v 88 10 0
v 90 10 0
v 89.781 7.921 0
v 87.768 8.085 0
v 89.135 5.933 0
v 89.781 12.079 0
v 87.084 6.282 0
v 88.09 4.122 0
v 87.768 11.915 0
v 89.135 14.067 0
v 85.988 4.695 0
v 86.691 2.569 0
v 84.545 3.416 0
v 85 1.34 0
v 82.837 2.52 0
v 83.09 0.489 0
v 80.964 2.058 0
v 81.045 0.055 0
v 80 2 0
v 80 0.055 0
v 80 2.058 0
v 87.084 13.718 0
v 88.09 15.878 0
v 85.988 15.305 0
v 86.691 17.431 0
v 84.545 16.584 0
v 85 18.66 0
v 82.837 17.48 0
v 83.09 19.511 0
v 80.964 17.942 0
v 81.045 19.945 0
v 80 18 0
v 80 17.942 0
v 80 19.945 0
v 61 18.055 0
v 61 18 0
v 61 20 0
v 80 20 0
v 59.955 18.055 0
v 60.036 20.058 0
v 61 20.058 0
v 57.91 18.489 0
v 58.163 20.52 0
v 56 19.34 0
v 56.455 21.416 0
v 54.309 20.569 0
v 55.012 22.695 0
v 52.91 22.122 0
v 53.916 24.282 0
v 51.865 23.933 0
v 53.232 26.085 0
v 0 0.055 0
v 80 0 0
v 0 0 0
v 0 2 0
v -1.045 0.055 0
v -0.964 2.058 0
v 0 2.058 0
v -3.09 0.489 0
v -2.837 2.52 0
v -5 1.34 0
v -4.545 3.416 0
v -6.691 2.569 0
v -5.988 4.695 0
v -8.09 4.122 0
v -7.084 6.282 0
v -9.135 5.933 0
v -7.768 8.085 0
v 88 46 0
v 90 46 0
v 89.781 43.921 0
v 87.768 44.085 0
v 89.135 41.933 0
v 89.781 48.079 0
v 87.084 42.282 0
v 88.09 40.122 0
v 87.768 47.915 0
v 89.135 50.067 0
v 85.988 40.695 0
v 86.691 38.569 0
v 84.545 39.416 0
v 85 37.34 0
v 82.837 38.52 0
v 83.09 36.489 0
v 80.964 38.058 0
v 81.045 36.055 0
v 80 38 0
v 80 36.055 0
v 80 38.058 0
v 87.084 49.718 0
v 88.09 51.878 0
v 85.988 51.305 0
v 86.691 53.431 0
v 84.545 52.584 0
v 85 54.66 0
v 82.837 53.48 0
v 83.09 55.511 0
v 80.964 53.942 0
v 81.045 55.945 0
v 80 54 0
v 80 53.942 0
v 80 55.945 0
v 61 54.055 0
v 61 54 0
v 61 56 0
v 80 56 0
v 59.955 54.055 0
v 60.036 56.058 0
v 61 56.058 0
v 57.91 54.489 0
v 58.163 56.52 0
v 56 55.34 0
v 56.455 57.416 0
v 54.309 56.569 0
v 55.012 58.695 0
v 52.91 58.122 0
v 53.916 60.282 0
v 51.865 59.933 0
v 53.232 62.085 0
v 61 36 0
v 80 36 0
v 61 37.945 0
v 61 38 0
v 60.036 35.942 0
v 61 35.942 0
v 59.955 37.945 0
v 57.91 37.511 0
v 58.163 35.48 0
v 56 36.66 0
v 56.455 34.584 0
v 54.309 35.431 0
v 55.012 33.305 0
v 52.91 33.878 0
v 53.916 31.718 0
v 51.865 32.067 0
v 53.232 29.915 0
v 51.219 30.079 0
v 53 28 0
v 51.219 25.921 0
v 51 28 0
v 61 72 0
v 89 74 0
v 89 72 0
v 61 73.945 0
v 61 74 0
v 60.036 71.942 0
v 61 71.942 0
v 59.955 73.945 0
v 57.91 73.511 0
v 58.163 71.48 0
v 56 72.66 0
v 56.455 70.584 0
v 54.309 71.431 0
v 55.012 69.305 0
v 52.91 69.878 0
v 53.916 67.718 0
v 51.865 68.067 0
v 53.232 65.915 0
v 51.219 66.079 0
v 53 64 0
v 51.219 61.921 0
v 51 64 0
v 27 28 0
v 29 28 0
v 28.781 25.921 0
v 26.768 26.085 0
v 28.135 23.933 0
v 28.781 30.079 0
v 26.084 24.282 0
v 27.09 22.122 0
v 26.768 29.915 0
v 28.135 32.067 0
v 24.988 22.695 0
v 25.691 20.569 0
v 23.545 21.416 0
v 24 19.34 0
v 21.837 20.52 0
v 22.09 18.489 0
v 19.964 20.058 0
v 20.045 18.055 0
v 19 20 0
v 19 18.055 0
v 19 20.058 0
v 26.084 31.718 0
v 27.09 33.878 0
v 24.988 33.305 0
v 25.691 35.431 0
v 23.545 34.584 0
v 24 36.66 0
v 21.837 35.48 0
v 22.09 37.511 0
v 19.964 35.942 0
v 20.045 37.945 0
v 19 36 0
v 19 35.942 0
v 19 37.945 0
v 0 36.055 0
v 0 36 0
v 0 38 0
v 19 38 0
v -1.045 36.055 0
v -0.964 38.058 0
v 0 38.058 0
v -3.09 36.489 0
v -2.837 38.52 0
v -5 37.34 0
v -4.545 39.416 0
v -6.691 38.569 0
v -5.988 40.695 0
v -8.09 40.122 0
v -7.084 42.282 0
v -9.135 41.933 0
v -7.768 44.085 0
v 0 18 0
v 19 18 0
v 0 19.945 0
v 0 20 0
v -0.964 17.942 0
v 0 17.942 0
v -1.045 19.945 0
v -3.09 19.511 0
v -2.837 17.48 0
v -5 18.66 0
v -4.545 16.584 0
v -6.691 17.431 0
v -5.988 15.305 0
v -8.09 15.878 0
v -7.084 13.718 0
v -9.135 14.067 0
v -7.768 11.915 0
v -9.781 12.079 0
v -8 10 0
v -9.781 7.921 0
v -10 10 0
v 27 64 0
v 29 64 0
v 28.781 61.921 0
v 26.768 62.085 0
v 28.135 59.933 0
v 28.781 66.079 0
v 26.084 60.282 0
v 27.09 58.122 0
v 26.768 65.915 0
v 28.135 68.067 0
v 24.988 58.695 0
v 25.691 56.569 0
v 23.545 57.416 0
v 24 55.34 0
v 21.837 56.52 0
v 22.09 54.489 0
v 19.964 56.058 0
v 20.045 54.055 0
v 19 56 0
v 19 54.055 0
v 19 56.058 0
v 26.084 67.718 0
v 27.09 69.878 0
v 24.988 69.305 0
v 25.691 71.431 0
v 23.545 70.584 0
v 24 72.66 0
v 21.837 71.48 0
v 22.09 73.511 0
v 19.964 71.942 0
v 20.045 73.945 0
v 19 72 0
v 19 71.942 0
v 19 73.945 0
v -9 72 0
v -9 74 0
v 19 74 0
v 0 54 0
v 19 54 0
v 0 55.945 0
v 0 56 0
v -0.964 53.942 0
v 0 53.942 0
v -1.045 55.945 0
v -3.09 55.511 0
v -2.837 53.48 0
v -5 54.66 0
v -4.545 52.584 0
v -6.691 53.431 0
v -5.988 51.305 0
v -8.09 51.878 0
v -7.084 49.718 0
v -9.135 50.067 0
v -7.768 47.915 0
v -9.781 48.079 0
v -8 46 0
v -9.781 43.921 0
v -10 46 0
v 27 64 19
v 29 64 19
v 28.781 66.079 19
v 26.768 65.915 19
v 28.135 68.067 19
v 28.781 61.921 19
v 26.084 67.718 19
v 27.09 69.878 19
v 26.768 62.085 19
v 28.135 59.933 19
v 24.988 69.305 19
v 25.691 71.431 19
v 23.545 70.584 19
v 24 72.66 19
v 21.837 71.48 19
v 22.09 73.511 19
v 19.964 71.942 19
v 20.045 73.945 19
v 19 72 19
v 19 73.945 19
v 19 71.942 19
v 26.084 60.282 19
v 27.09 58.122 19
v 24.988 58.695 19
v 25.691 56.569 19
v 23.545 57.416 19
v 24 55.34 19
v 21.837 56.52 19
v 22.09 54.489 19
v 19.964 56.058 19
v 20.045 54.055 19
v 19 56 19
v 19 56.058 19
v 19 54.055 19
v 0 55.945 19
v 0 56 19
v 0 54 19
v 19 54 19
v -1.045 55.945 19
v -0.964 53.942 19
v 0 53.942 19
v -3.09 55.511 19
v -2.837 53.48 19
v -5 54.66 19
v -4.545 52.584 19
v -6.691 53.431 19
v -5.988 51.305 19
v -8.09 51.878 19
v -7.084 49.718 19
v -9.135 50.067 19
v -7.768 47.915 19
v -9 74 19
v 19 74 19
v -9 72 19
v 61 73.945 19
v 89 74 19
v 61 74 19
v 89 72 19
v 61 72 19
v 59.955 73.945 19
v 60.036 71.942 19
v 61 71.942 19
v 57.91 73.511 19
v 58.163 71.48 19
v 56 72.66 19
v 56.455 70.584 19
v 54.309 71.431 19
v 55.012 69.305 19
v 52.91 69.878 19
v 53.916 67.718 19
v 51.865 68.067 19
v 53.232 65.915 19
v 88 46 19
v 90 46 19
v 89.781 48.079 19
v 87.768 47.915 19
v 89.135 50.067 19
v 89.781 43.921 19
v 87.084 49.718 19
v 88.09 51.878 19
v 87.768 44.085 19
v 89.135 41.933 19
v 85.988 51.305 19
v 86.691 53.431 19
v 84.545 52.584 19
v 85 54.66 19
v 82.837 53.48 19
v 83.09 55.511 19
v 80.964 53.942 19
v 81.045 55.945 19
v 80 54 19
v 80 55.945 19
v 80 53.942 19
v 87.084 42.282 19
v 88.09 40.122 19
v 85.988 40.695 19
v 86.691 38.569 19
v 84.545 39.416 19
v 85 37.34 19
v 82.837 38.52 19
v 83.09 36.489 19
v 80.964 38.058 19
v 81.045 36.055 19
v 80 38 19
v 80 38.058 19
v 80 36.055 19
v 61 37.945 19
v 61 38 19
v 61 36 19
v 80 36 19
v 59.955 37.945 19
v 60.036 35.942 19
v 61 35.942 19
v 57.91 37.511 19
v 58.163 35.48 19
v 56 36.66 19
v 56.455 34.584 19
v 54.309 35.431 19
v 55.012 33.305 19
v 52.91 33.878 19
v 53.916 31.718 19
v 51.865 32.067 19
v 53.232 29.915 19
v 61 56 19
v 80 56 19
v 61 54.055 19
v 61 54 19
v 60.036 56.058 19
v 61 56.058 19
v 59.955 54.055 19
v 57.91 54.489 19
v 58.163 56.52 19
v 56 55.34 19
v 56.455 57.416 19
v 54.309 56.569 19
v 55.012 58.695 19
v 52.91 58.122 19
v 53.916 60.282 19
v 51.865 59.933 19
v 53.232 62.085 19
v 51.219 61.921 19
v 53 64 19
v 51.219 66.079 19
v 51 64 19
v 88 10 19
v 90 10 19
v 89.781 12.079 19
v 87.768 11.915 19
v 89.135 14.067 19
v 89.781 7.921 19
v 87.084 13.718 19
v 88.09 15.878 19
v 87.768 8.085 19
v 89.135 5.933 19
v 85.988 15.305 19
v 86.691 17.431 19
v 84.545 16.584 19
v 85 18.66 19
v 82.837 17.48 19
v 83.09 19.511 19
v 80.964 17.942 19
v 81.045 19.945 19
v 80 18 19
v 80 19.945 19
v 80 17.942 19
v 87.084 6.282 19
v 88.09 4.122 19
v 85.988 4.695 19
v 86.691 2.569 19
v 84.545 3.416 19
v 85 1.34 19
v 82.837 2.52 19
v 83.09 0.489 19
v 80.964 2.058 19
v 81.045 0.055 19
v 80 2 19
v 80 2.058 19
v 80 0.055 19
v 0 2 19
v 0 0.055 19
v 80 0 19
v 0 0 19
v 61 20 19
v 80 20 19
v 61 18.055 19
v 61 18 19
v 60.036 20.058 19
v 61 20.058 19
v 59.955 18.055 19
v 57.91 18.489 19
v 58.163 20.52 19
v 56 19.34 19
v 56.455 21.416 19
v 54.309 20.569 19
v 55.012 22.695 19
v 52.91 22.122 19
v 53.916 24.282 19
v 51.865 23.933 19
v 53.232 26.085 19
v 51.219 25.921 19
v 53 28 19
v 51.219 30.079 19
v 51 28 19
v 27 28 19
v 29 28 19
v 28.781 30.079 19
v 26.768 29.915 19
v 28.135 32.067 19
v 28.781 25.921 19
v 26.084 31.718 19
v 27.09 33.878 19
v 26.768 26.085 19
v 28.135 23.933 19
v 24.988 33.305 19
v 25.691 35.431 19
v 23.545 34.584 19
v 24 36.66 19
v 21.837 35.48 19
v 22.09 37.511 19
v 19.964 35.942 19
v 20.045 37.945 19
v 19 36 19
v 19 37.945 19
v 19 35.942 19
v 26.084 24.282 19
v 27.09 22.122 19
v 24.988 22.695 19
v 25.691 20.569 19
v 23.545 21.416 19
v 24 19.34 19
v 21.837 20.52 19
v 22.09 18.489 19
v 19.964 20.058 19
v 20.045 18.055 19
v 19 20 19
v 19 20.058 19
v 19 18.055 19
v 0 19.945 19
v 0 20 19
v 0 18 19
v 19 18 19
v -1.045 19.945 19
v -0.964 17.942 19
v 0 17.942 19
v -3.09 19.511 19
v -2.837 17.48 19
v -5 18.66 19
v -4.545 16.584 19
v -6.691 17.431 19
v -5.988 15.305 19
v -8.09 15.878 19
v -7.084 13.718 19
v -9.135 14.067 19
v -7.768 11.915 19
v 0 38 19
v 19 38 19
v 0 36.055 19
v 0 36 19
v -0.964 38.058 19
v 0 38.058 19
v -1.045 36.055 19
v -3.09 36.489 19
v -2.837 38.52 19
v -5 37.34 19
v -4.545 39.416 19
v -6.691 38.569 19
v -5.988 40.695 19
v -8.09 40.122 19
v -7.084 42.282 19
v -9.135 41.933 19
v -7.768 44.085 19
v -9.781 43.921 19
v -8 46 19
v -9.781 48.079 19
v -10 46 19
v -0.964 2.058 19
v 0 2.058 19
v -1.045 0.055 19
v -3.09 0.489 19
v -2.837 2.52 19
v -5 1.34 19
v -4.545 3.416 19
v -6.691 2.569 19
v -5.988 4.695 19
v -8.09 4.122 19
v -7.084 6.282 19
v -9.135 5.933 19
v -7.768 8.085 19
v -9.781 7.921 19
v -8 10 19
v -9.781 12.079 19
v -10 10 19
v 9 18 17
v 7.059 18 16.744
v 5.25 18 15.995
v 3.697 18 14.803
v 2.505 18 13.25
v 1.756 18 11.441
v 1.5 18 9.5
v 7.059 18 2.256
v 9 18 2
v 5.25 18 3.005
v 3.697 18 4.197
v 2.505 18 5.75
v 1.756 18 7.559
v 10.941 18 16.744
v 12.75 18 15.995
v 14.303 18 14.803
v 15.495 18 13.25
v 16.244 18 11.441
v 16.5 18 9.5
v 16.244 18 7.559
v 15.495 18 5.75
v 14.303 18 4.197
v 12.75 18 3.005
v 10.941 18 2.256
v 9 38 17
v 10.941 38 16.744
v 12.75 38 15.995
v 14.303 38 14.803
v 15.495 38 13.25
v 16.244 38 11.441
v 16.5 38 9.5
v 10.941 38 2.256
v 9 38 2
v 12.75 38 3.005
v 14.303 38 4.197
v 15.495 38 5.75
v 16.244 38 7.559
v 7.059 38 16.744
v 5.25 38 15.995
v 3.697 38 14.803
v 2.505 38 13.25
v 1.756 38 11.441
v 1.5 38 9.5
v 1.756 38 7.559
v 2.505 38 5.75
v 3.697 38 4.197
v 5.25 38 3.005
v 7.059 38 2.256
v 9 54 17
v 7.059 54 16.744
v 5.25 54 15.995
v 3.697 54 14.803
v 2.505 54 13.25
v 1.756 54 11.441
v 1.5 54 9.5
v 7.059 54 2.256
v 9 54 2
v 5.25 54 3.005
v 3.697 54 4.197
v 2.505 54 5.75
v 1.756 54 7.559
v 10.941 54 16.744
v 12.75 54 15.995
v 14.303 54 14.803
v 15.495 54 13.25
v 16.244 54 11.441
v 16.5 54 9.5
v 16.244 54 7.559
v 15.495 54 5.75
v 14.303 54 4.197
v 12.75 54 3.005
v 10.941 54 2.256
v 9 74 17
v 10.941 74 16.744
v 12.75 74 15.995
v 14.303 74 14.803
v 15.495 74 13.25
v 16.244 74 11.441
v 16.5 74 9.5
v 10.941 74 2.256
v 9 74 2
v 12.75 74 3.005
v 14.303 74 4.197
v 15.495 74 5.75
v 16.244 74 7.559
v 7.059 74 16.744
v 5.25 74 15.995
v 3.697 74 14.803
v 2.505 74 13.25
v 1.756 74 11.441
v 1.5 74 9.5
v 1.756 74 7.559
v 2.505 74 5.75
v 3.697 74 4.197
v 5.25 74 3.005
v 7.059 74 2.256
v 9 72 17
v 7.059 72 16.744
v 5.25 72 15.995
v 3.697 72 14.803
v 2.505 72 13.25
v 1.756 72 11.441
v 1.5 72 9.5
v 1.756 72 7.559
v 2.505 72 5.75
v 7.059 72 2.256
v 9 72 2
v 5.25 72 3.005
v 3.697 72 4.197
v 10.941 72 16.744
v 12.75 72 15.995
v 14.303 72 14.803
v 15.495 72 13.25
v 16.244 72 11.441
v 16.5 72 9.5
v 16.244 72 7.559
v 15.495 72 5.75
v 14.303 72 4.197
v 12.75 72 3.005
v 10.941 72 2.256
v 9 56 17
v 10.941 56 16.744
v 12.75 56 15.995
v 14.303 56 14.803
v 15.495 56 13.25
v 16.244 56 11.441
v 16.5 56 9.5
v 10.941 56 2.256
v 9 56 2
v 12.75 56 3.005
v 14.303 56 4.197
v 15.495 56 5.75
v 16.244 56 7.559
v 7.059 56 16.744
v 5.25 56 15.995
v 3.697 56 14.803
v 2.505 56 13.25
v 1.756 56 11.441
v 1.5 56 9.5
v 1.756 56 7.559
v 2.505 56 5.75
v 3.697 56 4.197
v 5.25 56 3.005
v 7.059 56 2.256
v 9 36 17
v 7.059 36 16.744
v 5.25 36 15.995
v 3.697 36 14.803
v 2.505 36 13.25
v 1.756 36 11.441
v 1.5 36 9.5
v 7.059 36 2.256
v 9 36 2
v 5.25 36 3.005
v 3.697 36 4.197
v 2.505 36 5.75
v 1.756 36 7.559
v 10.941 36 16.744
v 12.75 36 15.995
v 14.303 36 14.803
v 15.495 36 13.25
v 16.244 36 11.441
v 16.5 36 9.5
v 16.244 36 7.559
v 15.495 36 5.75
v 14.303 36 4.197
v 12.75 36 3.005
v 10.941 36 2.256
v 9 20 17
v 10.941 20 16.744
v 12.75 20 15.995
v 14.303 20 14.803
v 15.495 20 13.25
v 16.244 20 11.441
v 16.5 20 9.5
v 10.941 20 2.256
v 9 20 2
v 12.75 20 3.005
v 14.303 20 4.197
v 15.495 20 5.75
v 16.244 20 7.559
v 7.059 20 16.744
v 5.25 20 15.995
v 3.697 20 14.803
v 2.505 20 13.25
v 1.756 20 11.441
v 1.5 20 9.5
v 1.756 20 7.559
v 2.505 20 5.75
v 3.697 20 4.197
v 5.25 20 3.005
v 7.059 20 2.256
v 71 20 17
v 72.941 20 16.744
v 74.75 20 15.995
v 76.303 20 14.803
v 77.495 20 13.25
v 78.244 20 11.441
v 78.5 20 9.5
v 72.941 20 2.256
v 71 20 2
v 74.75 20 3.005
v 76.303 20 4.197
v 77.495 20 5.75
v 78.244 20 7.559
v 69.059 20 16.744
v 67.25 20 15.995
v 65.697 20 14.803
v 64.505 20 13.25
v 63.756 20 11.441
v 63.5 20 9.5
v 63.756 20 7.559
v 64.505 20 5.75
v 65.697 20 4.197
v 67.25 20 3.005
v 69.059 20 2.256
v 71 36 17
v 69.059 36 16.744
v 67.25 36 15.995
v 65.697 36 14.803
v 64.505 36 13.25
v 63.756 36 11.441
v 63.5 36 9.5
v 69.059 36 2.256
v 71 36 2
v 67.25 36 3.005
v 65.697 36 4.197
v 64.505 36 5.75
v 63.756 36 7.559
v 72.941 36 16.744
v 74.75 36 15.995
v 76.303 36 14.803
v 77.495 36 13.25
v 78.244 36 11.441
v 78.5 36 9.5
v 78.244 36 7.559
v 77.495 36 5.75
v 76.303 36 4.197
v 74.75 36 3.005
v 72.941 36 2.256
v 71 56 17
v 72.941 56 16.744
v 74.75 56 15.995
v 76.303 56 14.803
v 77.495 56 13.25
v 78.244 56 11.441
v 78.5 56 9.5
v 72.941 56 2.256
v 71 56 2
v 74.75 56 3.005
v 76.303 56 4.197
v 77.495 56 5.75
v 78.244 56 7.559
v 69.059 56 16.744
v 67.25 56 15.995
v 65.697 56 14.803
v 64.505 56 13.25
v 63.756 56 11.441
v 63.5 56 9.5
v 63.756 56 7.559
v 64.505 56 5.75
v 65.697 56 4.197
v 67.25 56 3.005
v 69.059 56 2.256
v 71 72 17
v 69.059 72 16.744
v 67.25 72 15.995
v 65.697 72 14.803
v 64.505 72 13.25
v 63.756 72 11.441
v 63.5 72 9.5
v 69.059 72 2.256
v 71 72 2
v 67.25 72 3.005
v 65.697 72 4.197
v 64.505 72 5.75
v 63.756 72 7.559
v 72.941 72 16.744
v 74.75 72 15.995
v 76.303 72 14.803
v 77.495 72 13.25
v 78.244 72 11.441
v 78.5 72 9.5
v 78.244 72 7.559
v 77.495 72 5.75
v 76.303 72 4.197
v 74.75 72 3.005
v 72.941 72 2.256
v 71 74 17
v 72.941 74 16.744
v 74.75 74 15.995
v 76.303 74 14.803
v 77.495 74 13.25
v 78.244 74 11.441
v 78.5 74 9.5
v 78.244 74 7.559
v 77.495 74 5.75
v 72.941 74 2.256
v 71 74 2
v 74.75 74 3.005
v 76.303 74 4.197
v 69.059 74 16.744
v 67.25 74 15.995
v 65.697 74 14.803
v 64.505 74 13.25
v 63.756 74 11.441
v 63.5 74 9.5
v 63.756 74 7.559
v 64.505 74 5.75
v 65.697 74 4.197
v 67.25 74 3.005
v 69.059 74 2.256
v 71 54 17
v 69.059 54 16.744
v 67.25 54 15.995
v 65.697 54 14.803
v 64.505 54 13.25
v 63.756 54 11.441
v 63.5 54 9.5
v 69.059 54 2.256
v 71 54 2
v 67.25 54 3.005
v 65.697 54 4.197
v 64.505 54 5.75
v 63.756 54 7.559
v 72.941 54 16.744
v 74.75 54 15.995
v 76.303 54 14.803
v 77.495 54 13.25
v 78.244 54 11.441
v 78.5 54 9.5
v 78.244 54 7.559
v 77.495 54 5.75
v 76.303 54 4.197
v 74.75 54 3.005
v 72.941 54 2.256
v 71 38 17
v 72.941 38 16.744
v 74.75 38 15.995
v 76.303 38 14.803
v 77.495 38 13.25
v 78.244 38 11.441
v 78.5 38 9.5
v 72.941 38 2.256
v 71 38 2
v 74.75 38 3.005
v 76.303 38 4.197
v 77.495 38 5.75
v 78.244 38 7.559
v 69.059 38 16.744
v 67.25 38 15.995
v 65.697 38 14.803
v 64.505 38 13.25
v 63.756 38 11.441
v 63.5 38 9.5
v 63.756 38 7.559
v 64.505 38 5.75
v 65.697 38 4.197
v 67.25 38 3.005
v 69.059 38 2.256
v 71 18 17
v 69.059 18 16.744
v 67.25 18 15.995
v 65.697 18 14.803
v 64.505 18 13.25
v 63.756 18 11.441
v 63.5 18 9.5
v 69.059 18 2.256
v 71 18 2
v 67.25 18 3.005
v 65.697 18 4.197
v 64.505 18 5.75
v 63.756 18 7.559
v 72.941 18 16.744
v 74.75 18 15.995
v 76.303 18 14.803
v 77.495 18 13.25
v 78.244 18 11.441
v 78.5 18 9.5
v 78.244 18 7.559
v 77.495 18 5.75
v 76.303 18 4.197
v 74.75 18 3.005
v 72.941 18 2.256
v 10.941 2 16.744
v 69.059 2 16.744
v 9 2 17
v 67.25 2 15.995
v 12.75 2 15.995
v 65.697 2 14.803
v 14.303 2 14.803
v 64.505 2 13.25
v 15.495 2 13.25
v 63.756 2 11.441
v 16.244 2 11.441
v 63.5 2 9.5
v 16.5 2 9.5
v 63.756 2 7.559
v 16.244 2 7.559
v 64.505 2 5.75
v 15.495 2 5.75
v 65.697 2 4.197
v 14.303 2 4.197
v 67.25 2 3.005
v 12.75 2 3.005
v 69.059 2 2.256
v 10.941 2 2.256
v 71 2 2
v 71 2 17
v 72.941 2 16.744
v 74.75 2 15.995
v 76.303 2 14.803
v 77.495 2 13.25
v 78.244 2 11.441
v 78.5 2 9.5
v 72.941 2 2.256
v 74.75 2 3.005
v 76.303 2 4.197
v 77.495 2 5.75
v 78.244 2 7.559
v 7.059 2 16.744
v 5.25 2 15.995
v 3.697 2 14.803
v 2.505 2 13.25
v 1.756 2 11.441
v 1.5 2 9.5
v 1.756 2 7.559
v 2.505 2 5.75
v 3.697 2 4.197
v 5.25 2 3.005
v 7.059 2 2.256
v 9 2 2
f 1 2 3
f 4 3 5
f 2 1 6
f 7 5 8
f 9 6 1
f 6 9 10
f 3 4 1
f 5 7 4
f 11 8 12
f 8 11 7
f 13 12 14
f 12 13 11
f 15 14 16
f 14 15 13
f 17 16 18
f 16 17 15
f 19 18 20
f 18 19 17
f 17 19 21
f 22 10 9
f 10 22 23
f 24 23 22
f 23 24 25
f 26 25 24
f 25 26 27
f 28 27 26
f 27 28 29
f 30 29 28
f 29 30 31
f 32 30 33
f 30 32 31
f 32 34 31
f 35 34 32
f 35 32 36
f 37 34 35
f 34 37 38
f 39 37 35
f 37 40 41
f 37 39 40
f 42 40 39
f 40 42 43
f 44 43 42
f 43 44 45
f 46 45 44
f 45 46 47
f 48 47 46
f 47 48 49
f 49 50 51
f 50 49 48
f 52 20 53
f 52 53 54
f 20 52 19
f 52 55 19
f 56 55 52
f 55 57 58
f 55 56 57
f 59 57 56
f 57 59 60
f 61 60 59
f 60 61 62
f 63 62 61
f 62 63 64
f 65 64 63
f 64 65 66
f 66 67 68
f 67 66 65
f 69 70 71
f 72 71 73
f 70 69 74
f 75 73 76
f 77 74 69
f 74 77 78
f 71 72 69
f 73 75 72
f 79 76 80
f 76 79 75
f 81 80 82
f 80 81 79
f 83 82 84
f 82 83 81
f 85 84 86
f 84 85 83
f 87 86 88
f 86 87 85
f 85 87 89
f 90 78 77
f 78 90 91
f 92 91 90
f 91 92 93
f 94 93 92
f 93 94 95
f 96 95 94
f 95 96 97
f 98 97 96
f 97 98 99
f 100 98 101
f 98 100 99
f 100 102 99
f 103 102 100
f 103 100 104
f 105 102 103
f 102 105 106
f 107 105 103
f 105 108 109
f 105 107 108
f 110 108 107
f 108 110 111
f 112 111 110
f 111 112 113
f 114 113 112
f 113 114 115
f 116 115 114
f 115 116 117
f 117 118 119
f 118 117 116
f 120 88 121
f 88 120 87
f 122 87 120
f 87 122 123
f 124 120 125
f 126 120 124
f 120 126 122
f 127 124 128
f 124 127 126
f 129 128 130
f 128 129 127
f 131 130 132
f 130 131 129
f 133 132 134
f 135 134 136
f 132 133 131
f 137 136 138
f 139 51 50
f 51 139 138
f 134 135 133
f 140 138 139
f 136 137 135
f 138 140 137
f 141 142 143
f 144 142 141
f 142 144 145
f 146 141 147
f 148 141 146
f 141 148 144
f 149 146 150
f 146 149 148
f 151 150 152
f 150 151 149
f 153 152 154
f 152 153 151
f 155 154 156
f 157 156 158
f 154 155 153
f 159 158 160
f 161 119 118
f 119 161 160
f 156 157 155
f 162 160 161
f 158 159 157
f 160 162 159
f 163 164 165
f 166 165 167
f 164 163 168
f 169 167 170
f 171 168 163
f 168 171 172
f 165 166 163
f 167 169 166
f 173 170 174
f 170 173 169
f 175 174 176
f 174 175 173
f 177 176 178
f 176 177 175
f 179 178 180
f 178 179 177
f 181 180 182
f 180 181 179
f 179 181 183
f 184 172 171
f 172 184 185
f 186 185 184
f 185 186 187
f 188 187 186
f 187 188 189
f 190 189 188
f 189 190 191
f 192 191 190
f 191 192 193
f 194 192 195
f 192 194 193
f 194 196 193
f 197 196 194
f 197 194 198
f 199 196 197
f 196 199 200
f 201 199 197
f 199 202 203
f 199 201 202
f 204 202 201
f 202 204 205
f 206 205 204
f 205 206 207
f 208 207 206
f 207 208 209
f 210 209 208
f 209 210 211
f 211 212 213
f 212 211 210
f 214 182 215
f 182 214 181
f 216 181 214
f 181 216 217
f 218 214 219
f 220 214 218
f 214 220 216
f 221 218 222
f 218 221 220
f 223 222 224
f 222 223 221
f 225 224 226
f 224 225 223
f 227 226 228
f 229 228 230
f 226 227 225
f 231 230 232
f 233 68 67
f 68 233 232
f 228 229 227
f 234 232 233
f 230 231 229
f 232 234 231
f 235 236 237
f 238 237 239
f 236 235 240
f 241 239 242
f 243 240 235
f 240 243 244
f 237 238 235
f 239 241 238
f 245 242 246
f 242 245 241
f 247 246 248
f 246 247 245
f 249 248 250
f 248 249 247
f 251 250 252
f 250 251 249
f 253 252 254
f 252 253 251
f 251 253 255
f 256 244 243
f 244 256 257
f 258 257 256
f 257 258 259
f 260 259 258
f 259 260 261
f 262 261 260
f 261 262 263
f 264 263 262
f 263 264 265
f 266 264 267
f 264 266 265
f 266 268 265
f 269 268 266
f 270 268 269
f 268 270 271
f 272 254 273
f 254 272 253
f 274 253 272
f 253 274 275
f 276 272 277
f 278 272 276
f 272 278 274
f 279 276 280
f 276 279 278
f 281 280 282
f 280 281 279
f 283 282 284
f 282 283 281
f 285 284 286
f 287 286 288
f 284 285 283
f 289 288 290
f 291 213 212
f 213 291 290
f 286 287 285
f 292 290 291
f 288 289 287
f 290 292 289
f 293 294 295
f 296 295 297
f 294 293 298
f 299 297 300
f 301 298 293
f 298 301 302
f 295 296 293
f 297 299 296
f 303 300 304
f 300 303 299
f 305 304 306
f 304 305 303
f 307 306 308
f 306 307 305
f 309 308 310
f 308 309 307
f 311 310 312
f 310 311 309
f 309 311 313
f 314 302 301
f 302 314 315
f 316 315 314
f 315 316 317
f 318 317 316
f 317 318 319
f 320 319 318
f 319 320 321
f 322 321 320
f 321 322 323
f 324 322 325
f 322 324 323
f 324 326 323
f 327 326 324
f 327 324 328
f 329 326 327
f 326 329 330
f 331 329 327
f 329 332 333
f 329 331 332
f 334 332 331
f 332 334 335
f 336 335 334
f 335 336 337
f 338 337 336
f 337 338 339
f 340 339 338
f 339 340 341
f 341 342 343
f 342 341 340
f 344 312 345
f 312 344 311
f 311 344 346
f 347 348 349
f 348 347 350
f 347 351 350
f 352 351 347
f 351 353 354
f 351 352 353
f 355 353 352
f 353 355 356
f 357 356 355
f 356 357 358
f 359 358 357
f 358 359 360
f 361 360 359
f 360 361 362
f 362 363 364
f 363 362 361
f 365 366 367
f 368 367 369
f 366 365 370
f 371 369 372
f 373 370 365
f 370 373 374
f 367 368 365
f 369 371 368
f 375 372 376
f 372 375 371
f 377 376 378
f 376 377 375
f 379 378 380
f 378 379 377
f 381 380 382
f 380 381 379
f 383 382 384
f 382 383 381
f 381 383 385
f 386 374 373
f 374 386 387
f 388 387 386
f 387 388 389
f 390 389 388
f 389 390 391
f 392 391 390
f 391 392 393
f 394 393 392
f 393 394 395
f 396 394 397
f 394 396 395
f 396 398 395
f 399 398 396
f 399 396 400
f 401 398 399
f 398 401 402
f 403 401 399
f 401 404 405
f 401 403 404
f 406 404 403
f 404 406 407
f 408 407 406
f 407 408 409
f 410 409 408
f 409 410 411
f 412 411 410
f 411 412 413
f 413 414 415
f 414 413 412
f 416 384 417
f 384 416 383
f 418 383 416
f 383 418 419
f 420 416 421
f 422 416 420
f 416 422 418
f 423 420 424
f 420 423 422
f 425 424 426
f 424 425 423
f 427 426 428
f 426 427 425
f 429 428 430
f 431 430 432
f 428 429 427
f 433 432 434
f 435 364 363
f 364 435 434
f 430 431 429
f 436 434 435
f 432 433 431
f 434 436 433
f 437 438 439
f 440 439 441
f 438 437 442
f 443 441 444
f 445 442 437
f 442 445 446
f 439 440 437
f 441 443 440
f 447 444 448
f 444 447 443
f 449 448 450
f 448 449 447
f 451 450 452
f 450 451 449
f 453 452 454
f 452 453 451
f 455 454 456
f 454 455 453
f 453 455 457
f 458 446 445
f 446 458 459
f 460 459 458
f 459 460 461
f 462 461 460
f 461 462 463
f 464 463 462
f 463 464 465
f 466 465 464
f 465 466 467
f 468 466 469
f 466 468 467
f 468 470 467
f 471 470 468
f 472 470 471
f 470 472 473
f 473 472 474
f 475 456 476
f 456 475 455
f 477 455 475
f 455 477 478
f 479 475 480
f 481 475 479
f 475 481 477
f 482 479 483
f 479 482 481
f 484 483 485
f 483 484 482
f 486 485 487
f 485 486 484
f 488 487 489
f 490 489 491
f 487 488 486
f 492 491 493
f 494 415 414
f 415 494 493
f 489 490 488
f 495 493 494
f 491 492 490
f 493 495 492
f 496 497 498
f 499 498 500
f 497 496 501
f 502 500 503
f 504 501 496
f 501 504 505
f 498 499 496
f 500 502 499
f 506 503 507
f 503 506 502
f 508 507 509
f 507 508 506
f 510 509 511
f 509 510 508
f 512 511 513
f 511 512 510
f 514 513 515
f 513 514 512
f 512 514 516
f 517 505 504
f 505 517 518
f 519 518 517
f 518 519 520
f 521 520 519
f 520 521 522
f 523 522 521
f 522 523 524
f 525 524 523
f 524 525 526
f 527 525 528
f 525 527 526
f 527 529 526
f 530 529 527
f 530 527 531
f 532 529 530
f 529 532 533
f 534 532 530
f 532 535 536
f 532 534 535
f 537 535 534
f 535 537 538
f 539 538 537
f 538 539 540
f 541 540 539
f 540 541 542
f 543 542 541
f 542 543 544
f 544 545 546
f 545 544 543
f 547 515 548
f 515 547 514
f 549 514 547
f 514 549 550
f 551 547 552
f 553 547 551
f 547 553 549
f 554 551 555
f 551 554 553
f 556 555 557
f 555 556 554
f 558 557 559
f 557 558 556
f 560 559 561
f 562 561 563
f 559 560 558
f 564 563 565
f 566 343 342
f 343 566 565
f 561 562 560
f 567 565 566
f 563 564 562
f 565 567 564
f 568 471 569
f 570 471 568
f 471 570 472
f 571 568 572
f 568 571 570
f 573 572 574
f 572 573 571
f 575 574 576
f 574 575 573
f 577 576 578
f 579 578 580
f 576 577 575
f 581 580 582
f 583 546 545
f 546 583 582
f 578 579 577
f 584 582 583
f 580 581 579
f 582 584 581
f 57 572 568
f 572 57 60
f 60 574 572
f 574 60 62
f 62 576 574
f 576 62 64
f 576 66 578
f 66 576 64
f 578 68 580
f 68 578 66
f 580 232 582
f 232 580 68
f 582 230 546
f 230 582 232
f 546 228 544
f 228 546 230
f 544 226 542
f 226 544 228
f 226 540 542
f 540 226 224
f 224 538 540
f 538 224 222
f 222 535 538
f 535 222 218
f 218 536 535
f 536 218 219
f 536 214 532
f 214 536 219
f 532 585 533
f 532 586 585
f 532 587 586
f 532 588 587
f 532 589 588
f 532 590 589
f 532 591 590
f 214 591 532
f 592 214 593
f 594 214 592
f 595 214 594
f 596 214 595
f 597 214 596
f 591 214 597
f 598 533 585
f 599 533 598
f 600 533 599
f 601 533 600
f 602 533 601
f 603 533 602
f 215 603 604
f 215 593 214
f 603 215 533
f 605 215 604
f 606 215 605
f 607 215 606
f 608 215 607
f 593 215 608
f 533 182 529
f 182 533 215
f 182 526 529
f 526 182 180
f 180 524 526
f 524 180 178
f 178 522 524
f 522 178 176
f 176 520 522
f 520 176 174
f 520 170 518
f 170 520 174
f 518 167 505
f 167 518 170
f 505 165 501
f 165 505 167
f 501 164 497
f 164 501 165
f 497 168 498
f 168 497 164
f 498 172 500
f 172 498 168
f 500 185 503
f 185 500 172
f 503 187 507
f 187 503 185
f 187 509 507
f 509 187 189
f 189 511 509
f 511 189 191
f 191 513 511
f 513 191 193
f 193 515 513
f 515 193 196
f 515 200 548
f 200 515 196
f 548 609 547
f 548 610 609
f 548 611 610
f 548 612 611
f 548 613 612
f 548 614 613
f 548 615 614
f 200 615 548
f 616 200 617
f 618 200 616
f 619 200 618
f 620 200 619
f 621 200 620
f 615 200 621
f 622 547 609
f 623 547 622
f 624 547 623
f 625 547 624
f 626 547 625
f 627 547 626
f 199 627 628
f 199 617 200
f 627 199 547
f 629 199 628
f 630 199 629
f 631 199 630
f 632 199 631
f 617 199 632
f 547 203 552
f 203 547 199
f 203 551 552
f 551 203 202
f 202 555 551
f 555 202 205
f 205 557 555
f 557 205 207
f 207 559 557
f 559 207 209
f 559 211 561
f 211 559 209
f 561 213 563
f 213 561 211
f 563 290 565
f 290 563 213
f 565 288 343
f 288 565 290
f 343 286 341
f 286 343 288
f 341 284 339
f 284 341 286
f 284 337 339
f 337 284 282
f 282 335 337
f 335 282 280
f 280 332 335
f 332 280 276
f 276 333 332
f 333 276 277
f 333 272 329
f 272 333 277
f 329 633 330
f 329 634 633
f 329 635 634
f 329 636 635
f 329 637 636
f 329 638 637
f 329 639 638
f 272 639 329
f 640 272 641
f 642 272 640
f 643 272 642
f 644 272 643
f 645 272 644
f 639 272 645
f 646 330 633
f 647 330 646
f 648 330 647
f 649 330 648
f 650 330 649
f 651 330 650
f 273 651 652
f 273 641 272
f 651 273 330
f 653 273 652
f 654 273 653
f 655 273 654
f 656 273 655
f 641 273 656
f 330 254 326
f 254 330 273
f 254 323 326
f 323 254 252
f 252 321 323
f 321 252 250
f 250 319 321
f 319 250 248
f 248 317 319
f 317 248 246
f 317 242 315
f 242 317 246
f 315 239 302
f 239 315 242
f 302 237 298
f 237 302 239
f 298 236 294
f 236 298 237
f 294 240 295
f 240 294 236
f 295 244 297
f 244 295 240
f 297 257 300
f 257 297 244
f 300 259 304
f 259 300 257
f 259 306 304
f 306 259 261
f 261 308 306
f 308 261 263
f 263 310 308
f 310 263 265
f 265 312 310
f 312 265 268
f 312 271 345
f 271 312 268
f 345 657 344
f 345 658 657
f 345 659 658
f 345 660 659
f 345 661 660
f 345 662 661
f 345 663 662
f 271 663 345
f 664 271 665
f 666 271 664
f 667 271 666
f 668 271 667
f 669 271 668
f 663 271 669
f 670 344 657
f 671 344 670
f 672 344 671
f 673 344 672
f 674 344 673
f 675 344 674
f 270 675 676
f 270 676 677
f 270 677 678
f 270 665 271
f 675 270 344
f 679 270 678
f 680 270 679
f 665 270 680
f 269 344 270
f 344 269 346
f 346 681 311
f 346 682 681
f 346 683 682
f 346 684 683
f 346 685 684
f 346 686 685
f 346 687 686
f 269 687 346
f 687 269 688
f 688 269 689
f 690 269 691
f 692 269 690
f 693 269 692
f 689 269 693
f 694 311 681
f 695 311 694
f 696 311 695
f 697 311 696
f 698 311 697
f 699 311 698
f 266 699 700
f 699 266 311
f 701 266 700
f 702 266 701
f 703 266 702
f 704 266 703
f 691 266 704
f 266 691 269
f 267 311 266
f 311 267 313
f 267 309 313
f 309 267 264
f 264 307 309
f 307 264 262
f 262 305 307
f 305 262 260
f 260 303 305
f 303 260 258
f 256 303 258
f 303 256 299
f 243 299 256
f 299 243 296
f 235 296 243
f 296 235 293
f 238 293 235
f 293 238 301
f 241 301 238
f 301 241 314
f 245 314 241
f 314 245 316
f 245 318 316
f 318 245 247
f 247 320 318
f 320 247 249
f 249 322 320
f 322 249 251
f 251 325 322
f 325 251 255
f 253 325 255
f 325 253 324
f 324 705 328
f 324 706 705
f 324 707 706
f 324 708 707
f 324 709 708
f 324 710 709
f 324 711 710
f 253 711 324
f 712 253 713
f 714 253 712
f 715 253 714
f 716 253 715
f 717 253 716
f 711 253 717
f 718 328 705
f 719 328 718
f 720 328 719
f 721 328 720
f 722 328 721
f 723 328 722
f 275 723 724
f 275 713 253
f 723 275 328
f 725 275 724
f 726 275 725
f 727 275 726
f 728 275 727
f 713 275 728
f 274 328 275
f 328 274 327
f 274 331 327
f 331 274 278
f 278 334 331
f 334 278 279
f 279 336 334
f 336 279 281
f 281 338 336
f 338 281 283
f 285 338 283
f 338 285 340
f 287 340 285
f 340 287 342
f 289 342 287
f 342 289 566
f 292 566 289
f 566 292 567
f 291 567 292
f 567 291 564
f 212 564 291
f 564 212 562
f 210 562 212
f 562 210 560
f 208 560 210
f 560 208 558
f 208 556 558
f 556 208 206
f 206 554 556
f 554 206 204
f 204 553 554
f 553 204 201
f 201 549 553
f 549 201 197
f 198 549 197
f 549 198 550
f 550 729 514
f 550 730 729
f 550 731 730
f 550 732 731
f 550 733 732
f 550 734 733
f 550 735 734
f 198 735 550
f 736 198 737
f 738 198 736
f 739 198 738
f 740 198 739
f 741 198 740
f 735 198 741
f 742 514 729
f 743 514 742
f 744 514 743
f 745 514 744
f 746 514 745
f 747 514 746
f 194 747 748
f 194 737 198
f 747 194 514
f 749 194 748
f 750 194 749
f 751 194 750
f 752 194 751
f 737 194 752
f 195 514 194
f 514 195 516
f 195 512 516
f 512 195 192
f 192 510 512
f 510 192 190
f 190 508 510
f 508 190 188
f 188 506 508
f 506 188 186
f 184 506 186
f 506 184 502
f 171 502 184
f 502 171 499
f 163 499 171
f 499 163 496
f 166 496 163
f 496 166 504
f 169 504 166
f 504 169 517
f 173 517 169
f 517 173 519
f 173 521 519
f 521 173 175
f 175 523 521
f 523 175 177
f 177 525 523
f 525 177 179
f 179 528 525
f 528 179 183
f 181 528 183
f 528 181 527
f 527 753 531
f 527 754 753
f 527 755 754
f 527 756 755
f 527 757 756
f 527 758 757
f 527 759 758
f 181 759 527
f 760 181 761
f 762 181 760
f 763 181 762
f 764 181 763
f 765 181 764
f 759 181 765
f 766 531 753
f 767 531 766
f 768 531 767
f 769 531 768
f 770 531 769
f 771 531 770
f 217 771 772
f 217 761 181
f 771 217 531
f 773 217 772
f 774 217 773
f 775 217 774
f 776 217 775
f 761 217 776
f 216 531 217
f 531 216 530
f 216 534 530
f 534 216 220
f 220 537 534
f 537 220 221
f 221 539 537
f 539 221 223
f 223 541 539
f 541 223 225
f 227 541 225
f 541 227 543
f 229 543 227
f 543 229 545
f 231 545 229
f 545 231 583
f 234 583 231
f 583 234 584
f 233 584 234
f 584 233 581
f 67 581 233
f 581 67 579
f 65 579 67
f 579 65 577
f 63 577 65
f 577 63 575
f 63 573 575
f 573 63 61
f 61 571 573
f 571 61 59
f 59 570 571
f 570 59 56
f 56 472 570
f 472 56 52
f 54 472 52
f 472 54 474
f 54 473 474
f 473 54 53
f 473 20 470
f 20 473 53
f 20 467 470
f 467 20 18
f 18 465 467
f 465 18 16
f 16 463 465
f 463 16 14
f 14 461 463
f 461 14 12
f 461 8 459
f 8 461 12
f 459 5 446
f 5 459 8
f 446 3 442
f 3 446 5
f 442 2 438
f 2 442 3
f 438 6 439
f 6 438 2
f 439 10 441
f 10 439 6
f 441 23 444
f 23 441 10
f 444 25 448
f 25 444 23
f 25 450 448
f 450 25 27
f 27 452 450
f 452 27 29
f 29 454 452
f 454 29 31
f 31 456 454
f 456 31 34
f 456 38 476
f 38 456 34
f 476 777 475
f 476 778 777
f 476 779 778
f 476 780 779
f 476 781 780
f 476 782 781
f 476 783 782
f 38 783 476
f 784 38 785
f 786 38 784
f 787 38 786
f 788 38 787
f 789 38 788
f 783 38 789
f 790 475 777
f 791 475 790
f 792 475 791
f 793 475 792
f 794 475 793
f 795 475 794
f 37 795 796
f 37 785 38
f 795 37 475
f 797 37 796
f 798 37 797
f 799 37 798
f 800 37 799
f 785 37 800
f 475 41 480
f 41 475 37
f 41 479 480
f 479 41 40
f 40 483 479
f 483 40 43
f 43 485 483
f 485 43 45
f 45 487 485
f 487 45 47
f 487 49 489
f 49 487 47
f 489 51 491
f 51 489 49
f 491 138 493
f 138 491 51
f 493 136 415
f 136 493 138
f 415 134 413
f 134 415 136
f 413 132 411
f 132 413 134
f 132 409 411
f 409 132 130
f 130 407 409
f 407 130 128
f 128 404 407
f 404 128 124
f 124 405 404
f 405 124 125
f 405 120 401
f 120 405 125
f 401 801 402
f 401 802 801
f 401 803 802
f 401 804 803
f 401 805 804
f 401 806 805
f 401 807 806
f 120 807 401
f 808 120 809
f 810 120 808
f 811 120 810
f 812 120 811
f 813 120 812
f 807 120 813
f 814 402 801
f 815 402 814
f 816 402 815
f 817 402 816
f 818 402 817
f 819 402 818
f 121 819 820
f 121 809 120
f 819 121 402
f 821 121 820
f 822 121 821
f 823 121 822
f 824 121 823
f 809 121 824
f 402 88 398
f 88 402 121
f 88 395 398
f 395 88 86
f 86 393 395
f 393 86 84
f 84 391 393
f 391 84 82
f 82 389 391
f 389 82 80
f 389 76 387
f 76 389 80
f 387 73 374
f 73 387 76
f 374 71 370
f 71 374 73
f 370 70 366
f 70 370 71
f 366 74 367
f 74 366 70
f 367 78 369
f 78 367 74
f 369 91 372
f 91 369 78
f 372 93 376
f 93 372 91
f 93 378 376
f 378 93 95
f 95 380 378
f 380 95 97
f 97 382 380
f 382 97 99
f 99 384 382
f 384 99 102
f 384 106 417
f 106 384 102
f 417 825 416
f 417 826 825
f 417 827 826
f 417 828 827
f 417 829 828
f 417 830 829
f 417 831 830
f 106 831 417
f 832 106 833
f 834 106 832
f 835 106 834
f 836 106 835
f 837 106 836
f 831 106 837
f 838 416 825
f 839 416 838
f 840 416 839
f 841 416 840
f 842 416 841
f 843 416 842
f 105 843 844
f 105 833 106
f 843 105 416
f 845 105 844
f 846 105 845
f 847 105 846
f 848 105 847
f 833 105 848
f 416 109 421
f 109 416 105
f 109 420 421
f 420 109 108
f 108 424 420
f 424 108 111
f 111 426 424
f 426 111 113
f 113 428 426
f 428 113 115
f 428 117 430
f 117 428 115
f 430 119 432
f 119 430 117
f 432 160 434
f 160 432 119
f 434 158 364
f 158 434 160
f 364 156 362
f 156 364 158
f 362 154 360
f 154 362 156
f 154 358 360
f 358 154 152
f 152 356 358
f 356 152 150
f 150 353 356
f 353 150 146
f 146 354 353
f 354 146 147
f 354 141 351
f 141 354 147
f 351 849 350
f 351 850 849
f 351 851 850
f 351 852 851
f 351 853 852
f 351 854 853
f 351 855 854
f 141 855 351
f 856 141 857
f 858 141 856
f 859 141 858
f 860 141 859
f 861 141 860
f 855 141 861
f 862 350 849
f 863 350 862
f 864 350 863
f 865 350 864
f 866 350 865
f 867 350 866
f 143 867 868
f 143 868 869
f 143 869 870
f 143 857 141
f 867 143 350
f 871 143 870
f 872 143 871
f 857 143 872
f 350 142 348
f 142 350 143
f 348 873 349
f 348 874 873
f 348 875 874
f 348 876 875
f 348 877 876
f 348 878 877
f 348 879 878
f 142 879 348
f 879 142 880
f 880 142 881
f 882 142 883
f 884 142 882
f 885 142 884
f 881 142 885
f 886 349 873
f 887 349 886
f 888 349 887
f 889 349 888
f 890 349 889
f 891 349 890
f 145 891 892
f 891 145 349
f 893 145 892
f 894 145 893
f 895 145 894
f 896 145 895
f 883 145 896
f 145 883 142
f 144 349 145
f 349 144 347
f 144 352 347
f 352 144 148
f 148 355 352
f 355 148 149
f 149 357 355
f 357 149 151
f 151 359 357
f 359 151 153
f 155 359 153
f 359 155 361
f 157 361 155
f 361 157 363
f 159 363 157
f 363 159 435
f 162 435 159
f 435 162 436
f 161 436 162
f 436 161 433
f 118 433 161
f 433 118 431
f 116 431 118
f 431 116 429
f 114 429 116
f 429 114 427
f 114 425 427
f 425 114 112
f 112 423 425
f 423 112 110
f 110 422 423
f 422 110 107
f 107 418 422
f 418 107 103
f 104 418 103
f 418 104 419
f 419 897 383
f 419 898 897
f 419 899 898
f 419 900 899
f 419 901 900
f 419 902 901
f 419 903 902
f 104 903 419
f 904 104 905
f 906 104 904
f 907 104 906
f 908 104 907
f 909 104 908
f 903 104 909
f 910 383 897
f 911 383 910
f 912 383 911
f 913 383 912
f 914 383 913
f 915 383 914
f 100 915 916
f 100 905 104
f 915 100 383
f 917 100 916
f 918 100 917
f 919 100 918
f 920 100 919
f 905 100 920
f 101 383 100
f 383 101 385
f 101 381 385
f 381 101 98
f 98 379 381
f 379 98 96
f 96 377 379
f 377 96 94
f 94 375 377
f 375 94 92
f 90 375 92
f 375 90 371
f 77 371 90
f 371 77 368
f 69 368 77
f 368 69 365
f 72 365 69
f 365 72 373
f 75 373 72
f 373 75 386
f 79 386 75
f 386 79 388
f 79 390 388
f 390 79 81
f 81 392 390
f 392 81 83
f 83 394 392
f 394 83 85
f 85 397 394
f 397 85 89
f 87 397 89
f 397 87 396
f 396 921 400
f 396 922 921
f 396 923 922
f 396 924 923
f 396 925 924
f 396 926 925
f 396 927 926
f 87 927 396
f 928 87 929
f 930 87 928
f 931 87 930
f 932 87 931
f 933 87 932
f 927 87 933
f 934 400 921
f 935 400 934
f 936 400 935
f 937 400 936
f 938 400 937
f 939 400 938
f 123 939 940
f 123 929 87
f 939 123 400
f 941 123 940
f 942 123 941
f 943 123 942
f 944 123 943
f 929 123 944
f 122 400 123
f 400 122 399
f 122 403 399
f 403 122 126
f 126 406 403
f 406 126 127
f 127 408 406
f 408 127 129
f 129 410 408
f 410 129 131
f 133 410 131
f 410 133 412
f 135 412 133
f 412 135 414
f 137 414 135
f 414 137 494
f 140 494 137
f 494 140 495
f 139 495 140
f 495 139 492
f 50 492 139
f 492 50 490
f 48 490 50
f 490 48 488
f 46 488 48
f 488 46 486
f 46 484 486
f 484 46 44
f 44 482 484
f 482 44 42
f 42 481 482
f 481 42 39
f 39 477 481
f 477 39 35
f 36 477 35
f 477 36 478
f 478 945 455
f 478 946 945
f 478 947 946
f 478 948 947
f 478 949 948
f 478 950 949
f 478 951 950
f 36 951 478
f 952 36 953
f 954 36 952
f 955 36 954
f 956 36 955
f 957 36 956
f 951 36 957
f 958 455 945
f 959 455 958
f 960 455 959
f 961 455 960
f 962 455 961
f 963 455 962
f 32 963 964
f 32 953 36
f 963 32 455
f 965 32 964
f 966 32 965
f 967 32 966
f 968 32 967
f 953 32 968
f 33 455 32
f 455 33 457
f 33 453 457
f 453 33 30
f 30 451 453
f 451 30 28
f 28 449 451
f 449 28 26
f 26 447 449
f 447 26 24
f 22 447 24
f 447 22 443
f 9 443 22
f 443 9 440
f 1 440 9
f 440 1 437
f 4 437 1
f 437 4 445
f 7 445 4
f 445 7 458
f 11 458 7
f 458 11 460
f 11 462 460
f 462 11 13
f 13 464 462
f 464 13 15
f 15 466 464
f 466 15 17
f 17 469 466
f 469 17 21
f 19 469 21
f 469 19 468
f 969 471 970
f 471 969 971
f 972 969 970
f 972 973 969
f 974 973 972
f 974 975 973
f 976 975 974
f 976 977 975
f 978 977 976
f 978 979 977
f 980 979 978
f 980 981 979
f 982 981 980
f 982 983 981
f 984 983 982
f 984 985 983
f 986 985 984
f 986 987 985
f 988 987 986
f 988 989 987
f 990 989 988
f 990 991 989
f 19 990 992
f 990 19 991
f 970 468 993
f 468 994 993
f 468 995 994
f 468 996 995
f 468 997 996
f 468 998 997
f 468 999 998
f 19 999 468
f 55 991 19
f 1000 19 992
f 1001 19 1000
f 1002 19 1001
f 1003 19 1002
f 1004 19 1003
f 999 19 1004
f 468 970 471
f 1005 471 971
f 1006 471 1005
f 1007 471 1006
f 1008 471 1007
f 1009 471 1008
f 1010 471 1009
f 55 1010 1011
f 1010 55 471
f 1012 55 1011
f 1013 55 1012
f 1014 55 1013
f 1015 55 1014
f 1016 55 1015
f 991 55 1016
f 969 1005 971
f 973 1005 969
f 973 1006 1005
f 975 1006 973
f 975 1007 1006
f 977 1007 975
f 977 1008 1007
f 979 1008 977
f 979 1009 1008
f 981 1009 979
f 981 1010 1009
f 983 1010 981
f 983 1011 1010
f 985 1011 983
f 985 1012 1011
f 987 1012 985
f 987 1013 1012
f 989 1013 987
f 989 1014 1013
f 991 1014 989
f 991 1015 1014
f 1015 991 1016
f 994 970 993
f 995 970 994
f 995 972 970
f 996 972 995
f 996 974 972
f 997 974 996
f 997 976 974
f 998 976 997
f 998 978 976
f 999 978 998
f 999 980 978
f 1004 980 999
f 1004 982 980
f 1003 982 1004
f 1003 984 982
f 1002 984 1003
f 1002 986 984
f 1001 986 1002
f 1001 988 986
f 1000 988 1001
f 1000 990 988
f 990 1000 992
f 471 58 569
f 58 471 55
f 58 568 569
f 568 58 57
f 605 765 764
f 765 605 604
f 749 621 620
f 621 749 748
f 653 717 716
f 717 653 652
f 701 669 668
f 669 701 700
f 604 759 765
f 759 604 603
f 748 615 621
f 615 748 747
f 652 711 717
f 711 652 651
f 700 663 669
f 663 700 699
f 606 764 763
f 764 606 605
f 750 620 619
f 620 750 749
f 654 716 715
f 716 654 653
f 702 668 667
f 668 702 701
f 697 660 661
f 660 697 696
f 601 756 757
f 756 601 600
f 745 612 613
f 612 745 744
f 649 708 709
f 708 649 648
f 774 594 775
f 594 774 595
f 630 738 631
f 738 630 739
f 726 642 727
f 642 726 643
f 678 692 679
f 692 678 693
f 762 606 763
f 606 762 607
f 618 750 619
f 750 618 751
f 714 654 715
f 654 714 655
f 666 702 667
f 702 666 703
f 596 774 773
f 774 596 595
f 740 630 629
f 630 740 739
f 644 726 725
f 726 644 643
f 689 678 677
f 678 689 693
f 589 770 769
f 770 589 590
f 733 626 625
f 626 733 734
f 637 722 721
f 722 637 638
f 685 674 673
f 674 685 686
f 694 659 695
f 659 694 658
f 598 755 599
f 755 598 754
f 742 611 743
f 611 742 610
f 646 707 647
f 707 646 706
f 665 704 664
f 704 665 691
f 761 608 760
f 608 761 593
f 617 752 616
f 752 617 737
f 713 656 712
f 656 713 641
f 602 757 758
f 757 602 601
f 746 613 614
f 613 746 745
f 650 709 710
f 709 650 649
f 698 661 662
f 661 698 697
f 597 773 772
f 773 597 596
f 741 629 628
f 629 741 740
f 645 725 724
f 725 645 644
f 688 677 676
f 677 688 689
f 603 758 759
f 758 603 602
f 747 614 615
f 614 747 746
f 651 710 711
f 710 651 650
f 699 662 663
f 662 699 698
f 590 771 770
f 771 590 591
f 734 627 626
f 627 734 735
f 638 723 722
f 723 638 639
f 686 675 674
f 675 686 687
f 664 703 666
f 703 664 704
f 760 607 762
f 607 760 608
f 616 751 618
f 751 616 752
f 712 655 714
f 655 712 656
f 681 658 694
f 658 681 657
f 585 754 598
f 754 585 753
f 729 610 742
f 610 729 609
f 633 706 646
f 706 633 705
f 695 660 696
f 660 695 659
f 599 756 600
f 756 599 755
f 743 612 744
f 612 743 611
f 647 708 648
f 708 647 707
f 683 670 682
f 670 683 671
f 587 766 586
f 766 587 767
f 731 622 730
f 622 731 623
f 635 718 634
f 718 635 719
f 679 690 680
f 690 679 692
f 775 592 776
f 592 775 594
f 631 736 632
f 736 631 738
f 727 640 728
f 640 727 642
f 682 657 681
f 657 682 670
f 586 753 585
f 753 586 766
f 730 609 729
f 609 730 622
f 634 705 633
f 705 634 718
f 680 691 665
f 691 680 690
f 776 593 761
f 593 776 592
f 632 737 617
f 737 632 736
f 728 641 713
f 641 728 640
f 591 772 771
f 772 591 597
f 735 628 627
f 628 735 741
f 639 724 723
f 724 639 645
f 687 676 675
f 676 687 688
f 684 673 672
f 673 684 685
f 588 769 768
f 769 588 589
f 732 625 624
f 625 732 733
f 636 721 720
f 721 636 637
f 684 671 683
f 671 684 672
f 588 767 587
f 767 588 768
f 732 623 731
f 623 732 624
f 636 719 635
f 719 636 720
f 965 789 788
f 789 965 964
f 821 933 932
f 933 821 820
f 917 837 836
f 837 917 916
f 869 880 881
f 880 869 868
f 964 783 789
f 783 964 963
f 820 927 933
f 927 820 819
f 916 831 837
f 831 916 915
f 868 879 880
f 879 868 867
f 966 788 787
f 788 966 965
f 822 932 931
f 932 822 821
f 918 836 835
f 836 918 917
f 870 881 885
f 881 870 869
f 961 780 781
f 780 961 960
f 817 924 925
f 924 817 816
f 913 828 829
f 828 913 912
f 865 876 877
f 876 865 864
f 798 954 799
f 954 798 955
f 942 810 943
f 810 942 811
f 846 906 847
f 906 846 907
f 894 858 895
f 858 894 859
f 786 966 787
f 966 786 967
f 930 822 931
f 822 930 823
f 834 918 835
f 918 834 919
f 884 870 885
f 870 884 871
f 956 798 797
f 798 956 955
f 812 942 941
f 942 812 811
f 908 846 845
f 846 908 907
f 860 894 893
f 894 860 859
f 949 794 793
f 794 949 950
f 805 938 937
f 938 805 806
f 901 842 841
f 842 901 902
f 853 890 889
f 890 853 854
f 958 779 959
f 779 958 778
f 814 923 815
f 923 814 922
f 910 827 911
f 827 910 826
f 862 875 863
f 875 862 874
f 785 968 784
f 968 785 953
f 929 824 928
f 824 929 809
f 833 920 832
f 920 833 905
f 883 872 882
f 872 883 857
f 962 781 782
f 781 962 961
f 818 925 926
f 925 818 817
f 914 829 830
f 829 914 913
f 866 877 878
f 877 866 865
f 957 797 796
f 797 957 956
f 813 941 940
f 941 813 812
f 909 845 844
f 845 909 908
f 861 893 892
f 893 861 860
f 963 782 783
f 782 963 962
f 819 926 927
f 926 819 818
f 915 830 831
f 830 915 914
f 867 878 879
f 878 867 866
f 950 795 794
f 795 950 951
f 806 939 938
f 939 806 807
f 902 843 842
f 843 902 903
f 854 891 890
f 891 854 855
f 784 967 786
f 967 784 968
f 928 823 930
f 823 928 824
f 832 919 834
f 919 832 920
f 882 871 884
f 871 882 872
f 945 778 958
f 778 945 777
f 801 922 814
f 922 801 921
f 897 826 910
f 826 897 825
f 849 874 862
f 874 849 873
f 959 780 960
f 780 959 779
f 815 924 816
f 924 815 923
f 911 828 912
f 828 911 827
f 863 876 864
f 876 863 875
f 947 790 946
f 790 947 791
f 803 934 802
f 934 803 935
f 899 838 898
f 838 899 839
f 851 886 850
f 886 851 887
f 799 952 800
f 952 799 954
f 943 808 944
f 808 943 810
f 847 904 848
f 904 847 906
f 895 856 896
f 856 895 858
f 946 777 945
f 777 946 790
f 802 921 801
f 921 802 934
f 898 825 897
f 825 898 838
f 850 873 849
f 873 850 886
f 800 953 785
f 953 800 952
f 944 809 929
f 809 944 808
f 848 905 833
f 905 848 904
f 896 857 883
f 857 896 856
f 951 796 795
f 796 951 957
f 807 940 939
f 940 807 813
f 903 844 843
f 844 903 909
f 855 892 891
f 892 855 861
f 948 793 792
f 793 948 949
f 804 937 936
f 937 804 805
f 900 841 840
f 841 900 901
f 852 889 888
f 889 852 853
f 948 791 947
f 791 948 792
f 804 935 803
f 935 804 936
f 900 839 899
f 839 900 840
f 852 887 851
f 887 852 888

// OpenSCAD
/****************************************************************/
/* File: springTubes.scad					*/
/* Version: v1							*/
/* Create by: Rom1 <rom1@canel.ch>				*/
/*            CANEL - https://www.canel.ch			*/
/* Date: 28 avril 2017						*/
/* License: GNU GENERAL PUBLIC LICENSE v3			*/
/* Programme: openscad						*/
/* Description:	Test's tube support like spring			*/
/****************************************************************/


/*************/
/* Variables */
/*************/

th = 2;			// Thinkness

dt = 15;       		// Diameter tube
ss = 18;        	// Space between the spring
bl = 80;        	// Base's length
sl = dt + 2*th;		// Spring's length
sc = 4;  		// Numbers of spring coils
wi = sl;		// Width


/***********/
/* Modules */
/***********/

module halfCircle(diameter = 20, thinkness = 2, orient = 0) {
	translate([0, (diameter + thinkness)/2, 0])
	difference(){
		circle(d = diameter + thinkness);
		circle(d = diameter - thinkness);
		rotate([0, 0, orient]) translate([0, -(diameter + thinkness)/2]) square([(ss + th)/2, ss + th]);
	}
}

module halfLoop(orient = "left", end = "no"){
	module piece(){
		halfCircle(ss, th);
		translate([0, ss]) square([sl, th]);
		if(end == "yes"){
			translate([sl, ss]) square([ss/2, th]);
		}
	}
	if(orient == "left") {
		piece();
	}
	if(orient == "right"){
		mirror([1, 0, 0]) piece();
	}
}

module loop(orient = "left", end = "no"){
	module piece(orient = "left"){
		halfLoop();
		translate([sl, ss]) mirror([1, 0, 0]) halfLoop();
		if(end == "yes"){
			translate([-ss/2, 2*ss]) square([ss/2, th]);
		}
	}
	if(orient == "left"){
		piece();
	}
	if(orient == "right"){
		mirror([1, 0, 0]) piece();
	}
}

module form3d(){
	linear_extrude(height = wi) {
		square([bl, th]);    // Base


		if(sc % 2 == 0){
			if(sc == 2){
				translate([0, (sc - 2)*ss]) loop("left", end = "yes");
				translate([bl, (sc - 2)*ss]) loop("right", end = "yes");
			}else{
				for(i = [0:sc/2-1]){
					translate([0, i*2*ss]) loop("left");
					translate([bl, i*2*ss]) loop("right");
				}
				translate([0, (sc - 2)*ss]) loop("left", end = "yes");
				translate([bl, (sc - 2)*ss]) loop("right", end = "yes");
			}
		}else{
			if(sc == 1){
				translate([0, (sc - 1)*ss]) halfLoop("left", end = "yes");
				translate([bl, (sc - 1)*ss]) halfLoop("right", end = "yes");

			}else{
				for(i = [0:sc/2-1]){
					translate([0, 2*i*ss]) loop("left");
					translate([bl, 2*i*ss]) loop("right");
				}
					translate([0, (sc - 1)*ss]) halfLoop("left", end = "yes");
					translate([bl, (sc - 1)*ss]) halfLoop("right", end = "yes");
			}
		}
	}
}


/********/
/* Main */
/********/

difference(){
	form3d();
	translate([ss/2, th, wi/2]) rotate([270, 0, 0]) cylinder(d = dt, h = sc*ss+th);
	translate([bl - ss/2, th, wi/2]) rotate([270, 0, 0]) cylinder(d = dt, h = sc*ss+th);
}
